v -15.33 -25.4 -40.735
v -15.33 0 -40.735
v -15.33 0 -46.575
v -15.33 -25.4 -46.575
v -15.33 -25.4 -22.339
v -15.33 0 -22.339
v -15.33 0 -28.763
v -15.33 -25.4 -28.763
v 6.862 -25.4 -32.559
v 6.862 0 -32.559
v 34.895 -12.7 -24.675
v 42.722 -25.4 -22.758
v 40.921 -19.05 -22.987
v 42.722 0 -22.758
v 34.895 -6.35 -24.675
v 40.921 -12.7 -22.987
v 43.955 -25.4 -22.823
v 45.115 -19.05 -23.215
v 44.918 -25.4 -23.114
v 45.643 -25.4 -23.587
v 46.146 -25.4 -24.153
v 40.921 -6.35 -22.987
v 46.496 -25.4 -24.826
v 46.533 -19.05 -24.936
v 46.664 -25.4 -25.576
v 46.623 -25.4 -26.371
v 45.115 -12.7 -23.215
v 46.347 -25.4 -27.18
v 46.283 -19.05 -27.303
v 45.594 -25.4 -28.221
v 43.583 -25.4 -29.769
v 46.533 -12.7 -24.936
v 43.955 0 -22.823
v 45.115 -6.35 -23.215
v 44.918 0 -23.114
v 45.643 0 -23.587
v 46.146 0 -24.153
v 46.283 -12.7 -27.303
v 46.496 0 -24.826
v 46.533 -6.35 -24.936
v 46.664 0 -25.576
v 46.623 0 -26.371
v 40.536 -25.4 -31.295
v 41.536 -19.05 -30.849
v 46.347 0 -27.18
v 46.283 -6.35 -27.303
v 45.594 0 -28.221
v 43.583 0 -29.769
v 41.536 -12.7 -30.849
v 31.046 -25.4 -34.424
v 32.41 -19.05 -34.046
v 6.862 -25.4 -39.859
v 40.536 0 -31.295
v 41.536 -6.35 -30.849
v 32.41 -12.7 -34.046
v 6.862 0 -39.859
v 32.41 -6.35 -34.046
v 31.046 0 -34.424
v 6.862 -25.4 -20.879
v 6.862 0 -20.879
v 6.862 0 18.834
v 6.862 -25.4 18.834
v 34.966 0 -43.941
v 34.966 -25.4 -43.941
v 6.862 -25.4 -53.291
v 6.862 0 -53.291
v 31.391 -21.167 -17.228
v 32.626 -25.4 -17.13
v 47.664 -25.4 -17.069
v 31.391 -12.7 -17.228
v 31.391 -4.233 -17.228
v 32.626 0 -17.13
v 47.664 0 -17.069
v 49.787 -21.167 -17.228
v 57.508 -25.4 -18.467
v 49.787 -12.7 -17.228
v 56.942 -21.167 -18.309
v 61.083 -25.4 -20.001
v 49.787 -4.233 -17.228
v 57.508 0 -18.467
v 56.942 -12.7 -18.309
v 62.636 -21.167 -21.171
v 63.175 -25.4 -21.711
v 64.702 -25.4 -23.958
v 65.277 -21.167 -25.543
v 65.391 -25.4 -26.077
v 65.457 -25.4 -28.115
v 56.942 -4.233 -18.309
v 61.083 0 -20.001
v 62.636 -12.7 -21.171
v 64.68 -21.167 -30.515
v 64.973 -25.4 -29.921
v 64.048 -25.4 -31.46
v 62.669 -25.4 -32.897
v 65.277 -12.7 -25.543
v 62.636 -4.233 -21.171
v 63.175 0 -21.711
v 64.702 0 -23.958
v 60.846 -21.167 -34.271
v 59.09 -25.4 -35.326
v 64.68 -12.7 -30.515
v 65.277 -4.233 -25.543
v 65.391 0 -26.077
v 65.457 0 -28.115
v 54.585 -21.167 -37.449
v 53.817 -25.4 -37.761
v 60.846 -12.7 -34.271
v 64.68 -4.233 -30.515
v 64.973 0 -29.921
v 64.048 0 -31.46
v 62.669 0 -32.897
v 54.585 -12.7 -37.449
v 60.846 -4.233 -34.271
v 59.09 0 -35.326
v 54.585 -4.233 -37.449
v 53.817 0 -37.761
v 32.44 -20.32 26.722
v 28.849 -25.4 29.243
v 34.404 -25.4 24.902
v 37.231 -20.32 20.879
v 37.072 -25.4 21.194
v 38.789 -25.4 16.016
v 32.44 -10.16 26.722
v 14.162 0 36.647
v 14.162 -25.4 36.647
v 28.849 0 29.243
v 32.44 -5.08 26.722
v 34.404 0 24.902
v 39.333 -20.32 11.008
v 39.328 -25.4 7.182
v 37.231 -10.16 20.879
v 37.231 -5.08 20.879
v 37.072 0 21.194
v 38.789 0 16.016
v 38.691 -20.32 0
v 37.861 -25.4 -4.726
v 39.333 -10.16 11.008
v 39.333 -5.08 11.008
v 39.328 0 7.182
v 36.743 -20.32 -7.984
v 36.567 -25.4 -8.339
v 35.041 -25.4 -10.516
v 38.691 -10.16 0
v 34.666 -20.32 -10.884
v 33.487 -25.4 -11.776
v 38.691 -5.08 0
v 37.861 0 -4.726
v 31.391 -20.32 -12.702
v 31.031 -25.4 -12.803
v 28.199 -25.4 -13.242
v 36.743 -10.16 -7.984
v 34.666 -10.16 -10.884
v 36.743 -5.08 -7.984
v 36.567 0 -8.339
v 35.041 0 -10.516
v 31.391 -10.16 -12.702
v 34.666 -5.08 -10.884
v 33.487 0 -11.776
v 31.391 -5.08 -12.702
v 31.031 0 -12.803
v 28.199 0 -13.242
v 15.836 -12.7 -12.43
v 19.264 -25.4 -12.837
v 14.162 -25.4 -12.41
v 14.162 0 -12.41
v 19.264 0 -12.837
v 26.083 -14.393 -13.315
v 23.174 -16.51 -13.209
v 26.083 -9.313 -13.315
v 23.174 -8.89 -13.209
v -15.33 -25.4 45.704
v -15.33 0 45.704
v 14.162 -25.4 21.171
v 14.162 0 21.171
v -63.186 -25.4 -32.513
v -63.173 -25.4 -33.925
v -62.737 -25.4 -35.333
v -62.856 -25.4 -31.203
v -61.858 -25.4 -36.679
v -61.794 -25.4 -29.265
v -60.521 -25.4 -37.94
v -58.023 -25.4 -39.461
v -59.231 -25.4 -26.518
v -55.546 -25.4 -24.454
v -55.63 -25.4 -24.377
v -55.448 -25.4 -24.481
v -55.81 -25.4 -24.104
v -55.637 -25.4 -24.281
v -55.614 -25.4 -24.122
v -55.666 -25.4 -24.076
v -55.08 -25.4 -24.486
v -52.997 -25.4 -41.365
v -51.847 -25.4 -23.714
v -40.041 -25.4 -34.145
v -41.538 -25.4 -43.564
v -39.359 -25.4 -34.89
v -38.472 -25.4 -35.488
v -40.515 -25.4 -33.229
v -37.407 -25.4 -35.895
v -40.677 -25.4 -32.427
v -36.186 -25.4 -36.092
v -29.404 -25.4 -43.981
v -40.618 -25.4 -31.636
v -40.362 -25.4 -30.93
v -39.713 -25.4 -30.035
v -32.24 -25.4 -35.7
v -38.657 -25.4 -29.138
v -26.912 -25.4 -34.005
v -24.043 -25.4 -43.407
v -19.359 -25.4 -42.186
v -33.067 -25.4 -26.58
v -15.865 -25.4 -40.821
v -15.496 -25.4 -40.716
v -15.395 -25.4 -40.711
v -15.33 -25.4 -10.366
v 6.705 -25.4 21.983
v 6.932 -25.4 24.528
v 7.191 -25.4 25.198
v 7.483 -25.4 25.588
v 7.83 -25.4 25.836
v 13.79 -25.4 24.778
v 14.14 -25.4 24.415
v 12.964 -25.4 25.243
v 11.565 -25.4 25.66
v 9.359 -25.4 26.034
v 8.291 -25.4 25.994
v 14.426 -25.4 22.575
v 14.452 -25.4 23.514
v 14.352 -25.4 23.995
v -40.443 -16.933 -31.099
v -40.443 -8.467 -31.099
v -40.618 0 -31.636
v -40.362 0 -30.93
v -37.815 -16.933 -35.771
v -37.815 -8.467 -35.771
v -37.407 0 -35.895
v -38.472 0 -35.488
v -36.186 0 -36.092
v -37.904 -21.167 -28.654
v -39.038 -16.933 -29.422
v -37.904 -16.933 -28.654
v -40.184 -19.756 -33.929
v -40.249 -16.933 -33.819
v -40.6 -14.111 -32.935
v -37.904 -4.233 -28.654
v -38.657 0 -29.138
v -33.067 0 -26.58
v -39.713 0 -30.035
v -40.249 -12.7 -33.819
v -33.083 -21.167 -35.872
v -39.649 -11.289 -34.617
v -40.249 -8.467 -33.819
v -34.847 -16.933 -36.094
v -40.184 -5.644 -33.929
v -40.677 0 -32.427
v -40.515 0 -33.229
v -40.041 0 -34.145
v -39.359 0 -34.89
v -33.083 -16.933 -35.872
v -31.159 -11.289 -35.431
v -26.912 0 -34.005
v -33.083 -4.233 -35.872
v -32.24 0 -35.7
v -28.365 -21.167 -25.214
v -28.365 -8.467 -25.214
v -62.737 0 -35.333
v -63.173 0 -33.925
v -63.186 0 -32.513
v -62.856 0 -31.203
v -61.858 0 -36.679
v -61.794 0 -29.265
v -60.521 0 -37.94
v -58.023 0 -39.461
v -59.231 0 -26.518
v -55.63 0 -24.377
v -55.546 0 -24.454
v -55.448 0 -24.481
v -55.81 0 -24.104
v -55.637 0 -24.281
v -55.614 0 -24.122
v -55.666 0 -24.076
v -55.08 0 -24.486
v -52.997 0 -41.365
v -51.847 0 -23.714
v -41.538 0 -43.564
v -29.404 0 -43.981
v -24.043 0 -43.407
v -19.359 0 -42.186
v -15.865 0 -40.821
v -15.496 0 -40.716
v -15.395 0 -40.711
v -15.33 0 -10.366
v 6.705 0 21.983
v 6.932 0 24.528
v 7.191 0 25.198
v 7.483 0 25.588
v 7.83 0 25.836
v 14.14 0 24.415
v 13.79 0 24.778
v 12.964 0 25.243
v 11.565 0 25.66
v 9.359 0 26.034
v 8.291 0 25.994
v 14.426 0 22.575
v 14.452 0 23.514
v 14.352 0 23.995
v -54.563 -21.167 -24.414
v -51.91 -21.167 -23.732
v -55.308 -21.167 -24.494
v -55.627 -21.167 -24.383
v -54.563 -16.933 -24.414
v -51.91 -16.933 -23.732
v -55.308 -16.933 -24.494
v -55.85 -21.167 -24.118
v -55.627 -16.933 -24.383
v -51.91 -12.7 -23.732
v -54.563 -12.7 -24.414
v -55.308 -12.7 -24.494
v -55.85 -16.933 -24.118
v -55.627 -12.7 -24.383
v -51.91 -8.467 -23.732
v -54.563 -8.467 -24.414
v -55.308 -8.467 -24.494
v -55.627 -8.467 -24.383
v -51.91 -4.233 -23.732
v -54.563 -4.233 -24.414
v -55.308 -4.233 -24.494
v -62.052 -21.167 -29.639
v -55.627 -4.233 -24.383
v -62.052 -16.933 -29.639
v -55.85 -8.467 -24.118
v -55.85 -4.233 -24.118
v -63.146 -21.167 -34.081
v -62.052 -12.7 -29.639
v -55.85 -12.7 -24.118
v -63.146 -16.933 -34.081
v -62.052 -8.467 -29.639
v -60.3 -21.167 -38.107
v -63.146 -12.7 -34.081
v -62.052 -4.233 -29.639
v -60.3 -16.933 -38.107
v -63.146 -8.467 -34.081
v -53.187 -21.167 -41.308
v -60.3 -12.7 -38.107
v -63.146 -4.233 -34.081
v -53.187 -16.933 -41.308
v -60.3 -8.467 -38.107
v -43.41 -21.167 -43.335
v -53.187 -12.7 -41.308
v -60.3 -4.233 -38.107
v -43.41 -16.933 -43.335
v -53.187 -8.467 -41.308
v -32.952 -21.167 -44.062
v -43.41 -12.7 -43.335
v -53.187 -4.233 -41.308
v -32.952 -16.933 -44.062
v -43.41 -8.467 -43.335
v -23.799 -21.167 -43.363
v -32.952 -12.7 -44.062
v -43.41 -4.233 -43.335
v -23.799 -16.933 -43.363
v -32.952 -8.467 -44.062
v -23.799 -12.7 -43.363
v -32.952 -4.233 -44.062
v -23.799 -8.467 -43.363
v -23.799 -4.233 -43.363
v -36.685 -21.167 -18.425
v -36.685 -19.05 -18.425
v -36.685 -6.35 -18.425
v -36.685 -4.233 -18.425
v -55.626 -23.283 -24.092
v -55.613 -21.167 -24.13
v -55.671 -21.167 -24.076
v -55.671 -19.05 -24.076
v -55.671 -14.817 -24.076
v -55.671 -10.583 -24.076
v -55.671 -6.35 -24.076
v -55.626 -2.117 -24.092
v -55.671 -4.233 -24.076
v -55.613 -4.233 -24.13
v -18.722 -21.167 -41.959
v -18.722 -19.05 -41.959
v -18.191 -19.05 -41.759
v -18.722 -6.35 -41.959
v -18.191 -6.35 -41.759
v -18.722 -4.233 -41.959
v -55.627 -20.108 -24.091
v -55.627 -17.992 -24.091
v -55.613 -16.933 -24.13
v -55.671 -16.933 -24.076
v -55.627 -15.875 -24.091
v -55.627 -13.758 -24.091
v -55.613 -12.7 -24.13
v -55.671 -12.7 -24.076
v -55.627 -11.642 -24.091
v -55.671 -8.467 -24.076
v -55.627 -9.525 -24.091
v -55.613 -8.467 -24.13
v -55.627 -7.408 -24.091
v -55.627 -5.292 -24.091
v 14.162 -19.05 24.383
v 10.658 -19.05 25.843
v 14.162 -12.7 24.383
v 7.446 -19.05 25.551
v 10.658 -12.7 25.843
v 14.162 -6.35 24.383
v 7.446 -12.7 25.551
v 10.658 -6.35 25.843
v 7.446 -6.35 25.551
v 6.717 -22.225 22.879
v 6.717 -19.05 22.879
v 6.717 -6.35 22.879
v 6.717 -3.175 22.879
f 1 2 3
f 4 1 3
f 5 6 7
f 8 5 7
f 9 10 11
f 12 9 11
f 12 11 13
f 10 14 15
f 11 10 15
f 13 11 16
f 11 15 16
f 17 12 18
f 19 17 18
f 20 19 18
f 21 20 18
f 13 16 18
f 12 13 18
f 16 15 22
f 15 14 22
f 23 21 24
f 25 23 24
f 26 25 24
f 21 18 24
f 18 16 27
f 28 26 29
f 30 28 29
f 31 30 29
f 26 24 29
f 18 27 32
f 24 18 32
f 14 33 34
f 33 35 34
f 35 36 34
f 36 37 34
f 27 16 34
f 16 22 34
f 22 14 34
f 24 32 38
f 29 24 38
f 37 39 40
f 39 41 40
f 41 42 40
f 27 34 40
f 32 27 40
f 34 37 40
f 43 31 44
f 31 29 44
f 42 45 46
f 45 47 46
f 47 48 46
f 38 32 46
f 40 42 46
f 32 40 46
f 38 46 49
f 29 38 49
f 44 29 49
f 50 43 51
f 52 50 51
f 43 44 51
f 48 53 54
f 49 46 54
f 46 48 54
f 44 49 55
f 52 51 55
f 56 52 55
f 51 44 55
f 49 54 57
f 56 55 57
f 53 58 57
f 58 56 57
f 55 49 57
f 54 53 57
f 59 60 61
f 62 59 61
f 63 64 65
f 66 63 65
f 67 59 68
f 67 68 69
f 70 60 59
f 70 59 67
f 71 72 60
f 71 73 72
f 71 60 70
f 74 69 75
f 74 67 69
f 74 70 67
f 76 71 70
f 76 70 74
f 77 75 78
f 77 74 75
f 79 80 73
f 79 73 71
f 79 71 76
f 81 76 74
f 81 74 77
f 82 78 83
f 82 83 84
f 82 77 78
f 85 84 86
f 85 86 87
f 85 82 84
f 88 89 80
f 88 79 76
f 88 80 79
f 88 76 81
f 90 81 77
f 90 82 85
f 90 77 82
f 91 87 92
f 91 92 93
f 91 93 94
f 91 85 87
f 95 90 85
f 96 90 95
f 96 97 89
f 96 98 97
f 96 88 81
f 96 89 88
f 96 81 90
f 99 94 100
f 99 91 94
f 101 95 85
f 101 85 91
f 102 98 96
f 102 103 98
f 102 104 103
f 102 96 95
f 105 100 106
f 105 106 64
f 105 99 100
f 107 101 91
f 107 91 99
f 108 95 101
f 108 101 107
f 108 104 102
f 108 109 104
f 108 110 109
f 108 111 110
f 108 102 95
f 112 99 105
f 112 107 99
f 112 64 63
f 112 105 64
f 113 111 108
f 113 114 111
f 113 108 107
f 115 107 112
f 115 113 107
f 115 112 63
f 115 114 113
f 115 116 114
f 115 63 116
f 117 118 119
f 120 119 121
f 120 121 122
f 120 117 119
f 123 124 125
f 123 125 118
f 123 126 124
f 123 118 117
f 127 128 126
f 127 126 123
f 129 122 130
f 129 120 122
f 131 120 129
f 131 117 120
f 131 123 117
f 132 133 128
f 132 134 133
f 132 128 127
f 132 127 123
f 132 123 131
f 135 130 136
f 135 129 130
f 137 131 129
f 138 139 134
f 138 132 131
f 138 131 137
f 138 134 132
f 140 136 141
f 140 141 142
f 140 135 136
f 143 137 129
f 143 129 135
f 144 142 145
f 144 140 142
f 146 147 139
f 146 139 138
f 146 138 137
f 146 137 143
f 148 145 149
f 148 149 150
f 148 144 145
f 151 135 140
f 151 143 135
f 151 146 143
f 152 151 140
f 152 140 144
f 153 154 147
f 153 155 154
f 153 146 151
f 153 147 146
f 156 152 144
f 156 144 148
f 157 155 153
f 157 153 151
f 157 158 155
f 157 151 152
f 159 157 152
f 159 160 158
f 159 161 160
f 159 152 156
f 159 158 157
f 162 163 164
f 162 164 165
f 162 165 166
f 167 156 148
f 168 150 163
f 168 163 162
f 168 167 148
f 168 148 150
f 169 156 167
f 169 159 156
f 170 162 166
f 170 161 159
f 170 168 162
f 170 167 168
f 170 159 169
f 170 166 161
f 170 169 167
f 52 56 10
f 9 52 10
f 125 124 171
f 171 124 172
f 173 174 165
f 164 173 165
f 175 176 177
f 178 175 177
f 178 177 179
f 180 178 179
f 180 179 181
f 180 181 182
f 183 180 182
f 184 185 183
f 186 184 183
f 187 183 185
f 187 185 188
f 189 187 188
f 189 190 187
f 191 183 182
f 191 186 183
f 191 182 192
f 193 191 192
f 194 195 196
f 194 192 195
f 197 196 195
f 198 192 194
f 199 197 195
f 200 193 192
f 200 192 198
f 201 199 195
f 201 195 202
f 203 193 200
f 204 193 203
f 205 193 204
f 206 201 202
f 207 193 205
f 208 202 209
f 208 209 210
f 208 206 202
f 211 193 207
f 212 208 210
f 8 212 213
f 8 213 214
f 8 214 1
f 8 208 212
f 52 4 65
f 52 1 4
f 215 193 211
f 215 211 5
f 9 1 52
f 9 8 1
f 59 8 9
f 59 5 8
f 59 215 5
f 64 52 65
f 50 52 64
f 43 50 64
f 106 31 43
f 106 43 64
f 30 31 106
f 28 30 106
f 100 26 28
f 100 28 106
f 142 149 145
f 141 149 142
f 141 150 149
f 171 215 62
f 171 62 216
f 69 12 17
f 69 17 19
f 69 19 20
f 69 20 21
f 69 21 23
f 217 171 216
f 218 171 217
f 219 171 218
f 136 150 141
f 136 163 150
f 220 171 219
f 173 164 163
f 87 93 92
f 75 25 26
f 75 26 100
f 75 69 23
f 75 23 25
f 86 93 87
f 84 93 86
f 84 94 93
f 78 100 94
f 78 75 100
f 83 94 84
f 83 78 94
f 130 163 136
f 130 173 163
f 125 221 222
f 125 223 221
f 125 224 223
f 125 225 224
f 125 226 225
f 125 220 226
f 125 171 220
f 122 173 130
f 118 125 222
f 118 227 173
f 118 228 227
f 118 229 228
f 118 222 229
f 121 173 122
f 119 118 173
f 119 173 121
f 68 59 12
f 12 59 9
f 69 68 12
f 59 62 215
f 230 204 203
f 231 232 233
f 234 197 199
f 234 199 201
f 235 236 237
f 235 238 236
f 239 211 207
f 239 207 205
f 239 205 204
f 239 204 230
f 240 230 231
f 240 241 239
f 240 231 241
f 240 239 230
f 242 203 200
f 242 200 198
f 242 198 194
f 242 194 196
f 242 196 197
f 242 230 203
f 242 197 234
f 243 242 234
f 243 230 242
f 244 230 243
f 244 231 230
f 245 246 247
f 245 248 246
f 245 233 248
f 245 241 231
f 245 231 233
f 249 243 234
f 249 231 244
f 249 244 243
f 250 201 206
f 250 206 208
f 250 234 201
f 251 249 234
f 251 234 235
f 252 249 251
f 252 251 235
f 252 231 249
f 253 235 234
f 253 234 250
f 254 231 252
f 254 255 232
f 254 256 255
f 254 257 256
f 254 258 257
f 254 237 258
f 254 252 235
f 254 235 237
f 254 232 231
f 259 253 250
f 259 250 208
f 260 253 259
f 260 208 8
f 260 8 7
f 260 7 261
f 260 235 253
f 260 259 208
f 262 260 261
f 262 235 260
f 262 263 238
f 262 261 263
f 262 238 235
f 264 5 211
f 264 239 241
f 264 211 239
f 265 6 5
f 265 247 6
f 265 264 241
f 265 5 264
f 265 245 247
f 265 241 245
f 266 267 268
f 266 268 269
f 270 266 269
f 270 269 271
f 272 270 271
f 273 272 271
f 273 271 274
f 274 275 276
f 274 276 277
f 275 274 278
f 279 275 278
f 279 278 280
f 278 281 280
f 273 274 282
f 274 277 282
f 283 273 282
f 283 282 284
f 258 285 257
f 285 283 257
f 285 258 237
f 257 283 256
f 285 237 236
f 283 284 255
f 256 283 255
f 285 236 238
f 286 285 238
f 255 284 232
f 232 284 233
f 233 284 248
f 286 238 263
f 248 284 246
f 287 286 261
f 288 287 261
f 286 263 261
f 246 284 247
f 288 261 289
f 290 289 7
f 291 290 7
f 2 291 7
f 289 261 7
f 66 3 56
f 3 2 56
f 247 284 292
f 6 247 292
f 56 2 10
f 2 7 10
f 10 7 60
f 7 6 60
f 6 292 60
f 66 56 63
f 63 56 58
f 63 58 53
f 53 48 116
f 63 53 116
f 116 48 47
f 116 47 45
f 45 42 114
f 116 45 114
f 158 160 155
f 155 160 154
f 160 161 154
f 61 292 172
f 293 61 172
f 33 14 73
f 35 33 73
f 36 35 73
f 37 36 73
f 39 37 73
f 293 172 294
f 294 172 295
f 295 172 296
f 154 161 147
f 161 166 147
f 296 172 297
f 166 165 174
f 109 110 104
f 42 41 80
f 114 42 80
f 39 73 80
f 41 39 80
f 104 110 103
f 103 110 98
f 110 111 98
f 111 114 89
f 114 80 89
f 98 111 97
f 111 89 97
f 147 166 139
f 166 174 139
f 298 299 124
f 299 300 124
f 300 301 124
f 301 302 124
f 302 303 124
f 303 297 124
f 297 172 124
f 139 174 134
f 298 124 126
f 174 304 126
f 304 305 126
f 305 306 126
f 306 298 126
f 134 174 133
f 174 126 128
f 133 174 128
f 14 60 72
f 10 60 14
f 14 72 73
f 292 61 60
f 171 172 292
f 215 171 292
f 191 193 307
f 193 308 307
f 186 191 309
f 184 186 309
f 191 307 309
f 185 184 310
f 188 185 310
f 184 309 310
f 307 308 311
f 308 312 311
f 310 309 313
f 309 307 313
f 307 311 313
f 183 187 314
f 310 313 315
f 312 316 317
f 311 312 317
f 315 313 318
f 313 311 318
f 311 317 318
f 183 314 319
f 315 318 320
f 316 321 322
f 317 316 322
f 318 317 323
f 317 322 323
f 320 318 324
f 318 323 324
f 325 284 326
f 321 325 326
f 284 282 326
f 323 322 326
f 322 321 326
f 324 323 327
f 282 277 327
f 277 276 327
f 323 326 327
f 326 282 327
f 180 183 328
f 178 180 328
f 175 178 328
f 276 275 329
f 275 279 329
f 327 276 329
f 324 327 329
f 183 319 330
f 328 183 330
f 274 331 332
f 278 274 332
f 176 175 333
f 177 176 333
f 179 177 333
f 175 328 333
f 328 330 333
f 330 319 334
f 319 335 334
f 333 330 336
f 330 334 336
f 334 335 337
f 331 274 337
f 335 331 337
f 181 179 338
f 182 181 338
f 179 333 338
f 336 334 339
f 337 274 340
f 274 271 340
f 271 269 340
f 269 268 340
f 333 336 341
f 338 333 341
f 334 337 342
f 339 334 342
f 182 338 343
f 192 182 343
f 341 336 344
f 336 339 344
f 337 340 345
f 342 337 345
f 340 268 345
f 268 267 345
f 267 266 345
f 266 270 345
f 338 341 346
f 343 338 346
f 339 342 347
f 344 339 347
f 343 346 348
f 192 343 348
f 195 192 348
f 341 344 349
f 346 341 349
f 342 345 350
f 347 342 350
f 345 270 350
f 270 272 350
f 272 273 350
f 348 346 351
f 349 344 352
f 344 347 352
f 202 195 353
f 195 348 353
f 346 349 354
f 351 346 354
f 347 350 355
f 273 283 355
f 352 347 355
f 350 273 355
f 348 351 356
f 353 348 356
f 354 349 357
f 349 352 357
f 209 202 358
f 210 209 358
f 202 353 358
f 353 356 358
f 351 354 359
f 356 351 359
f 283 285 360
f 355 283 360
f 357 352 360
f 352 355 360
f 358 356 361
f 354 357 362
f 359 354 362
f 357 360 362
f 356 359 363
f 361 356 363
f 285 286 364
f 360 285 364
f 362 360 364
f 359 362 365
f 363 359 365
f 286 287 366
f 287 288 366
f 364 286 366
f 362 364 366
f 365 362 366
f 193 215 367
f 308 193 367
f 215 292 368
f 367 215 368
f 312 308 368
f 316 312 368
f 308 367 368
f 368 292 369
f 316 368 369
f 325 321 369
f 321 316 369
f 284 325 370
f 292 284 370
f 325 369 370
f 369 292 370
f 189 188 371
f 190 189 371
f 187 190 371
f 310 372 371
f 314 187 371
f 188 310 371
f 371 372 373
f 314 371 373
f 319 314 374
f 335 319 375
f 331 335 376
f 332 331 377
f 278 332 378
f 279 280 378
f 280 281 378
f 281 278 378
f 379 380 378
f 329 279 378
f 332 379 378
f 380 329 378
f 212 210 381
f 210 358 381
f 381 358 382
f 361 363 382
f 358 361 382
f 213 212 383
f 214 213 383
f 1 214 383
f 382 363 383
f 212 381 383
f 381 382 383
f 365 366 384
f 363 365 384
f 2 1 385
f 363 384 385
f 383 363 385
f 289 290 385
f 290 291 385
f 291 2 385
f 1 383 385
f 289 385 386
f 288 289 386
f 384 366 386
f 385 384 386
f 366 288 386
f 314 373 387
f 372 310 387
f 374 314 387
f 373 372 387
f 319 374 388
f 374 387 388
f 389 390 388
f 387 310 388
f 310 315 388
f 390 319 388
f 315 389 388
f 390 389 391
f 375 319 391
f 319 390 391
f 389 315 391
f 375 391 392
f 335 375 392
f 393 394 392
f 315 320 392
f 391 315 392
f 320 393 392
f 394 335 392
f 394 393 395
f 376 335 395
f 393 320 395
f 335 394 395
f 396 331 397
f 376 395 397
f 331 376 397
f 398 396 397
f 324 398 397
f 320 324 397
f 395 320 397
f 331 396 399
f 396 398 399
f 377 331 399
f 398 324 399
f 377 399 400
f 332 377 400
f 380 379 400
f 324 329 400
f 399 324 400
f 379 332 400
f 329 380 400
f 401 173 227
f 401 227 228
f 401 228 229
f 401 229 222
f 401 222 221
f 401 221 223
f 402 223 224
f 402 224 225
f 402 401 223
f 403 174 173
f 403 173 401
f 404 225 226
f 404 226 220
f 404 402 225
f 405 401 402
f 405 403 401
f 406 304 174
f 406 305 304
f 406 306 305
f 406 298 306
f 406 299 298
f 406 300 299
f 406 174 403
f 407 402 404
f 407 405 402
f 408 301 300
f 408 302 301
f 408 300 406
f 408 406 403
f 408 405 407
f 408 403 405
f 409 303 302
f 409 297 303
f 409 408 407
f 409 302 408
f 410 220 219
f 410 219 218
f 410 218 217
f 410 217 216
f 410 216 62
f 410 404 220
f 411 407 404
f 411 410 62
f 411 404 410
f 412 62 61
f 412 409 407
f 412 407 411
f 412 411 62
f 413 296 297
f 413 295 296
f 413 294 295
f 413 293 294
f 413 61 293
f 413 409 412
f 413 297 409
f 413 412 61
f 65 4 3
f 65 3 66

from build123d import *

# Parameters (mm, degrees)
F1_DEPTH = 25.4


with BuildPart() as f1:
    # F0 (on Front) → F1 (new body)
    with BuildSketch(Plane.XZ):
        with BuildLine():
            Line((-15.3303835541, -41.0270281136), (-15.3303835541, -46.5751625597))
            Line((-15.3303835541, -46.5751625597), (6.8621719256, -53.2913357019))
            Line((6.8621719256, -53.2913357019), (6.8621719256, -39.8589968681))
            Line((6.8621719256, -39.8589968681), (6.8621719256, -32.5588136911))
            Line((6.8621719256, -32.5588136911), (6.8621719256, -20.8785217255))
            Line((6.8621719256, -20.8785217255), (6.8621719256, 18.8344717026))
            add(Edge.make_bspline(
                [(14.1623523086, 21.1705304682), (14.4264375928, 22.3843703264), (14.9776139766, 24.917793821), (10.6853785059, 25.8987456687), (6.3392125116, 26.5024260876), (6.6678848939, 21.683228331), (6.8621719256, 18.8344717026)],
                knots=[0, 0, 0, 0, 0.220366293, 0.4599298172, 0.6807500769, 1, 1, 1, 1], degree=3))
            Line((14.1623523086, 21.1705304682), (14.1623523086, -12.4103110284))
            add(Edge.make_bspline(
                [(14.1623523086, 36.6469174623), (18.1059212038, 34.8455598925), (26.2188057649, 31.1397273318), (40.2392334697, 22.2058630586), (39.3449689326, 0.2448984557), (35.4080251913, -16.7285134667), (15.009821869, -11.9220096004), (14.1623523086, -12.4103110284)],
                knots=[0, 0, 0, 0, 0.1771529227, 0.3644468373, 0.5865030589, 0.7722885895, 0.9737711488, 0.9737711488, 0.9737711488, 0.9737711488], degree=3))
            Line((14.1623523086, 36.6469174623), (-15.3303835541, 45.7038161606))
            Line((-15.3303835541, 45.7038161606), (-15.3303835541, -10.3662600741))
            Line((-15.3303835541, -10.3662600741), (-15.3303835541, -22.3385579884))
            Line((-15.3303835541, -22.3385579884), (-15.3303835541, -28.7627186626))
            Line((-15.3303835541, -28.7627186626), (-15.3303835541, -40.7350212336))
            add(Edge.make_bspline(
                [(-15.3303835541, -40.7350212336), (-15.2712927491, -40.7837414321), (-15.3008381516, -40.9053847728), (-15.3303835541, -41.0270281136)],
                knots=[0.9760015175, 0.9760015175, 0.9760015175, 0.9760015175, 1, 1, 1, 1], degree=3))
        make_face()
        with BuildLine():
            Line((-15.3303835541, -40.7350212336), (-15.3303835541, -41.0270281136))
            add(Edge.make_bspline(
                [(-15.3303835541, -40.7350212336), (-15.2712927491, -40.7837414321), (-15.3008381516, -40.9053847728), (-15.3303835541, -41.0270281136)],
                knots=[0.9760015175, 0.9760015175, 0.9760015175, 0.9760015175, 1, 1, 1, 1], degree=3))
        make_face()
        with BuildLine():
            Line((6.8621719256, -39.8589968681), (6.8621719256, -53.2913357019))
            add(Edge.make_bspline(
                [(6.8621719256, -20.8785217255), (15.3042216434, -19.378819076), (31.0173786315, -16.5874278907), (49.0894784823, -16.7967105962), (63.6993881596, -18.9897924504), (68.6223083484, -33.9934598901), (36.3748012962, -43.1794652259), (16.9488069817, -49.8353661932), (6.8621719256, -53.2913357019)],
                knots=[0, 0, 0, 0, 0.1832299895, 0.3410453251, 0.4759333054, 0.5897297817, 0.7869737889, 1, 1, 1, 1], degree=3))
            Line((6.8621719256, -20.8785217255), (6.8621719256, -32.5588136911))
            add(Edge.make_bspline(
                [(6.8621719256, -32.5588136911), (17.075486717, -29.783960217), (33.370052461, -25.3568928752), (45.3413435566, -21.2588853056), (49.396785617, -31.105994635), (25.1915382166, -36.0870810059), (6.8621719256, -39.8589968681)],
                knots=[0, 0, 0, 0, 0.3155094949, 0.5033713649, 0.6239291418, 1, 1, 1, 1], degree=3))
        make_face()
        with BuildLine():
            add(Edge.make_bspline(
                [(-15.3303835541, -10.3662600741), (-35.2206782898, -17.9375768513), (-56.7564818958, -26.1352628746), (-55.0956742109, -23.3134101991), (-64.396064605, -29.5675464926), (-62.7832606242, -42.0369715173), (-24.8258652624, -46.3806221426), (-15.6559974585, -40.4665535073), (-15.3303835541, -40.7350212336)],
                knots=[0, 0, 0, 0, 0.2900837403, 0.3140821462, 0.443471427, 0.5740686868, 0.843760307, 0.9760015175, 0.9760015175, 0.9760015175, 0.9760015175], degree=3))
            Line((-15.3303835541, -40.7350212336), (-15.3303835541, -28.7627186626))
            add(Edge.make_bspline(
                [(-15.3303835541, -22.3385579884), (-27.010916279, -24.7241738586), (-43.9353309171, -28.1807929276), (-37.4681885021, -39.4346237824), (-24.267423007, -33.070970421), (-15.3303835541, -28.7627186626)],
                knots=[0, 0, 0, 0, 0.4184182917, 0.6062638433, 1, 1, 1, 1], degree=3))
            Line((-15.3303835541, -22.3385579884), (-15.3303835541, -10.3662600741))
        make_face()
    extrude(amount=F1_DEPTH)


solid = f1.part
